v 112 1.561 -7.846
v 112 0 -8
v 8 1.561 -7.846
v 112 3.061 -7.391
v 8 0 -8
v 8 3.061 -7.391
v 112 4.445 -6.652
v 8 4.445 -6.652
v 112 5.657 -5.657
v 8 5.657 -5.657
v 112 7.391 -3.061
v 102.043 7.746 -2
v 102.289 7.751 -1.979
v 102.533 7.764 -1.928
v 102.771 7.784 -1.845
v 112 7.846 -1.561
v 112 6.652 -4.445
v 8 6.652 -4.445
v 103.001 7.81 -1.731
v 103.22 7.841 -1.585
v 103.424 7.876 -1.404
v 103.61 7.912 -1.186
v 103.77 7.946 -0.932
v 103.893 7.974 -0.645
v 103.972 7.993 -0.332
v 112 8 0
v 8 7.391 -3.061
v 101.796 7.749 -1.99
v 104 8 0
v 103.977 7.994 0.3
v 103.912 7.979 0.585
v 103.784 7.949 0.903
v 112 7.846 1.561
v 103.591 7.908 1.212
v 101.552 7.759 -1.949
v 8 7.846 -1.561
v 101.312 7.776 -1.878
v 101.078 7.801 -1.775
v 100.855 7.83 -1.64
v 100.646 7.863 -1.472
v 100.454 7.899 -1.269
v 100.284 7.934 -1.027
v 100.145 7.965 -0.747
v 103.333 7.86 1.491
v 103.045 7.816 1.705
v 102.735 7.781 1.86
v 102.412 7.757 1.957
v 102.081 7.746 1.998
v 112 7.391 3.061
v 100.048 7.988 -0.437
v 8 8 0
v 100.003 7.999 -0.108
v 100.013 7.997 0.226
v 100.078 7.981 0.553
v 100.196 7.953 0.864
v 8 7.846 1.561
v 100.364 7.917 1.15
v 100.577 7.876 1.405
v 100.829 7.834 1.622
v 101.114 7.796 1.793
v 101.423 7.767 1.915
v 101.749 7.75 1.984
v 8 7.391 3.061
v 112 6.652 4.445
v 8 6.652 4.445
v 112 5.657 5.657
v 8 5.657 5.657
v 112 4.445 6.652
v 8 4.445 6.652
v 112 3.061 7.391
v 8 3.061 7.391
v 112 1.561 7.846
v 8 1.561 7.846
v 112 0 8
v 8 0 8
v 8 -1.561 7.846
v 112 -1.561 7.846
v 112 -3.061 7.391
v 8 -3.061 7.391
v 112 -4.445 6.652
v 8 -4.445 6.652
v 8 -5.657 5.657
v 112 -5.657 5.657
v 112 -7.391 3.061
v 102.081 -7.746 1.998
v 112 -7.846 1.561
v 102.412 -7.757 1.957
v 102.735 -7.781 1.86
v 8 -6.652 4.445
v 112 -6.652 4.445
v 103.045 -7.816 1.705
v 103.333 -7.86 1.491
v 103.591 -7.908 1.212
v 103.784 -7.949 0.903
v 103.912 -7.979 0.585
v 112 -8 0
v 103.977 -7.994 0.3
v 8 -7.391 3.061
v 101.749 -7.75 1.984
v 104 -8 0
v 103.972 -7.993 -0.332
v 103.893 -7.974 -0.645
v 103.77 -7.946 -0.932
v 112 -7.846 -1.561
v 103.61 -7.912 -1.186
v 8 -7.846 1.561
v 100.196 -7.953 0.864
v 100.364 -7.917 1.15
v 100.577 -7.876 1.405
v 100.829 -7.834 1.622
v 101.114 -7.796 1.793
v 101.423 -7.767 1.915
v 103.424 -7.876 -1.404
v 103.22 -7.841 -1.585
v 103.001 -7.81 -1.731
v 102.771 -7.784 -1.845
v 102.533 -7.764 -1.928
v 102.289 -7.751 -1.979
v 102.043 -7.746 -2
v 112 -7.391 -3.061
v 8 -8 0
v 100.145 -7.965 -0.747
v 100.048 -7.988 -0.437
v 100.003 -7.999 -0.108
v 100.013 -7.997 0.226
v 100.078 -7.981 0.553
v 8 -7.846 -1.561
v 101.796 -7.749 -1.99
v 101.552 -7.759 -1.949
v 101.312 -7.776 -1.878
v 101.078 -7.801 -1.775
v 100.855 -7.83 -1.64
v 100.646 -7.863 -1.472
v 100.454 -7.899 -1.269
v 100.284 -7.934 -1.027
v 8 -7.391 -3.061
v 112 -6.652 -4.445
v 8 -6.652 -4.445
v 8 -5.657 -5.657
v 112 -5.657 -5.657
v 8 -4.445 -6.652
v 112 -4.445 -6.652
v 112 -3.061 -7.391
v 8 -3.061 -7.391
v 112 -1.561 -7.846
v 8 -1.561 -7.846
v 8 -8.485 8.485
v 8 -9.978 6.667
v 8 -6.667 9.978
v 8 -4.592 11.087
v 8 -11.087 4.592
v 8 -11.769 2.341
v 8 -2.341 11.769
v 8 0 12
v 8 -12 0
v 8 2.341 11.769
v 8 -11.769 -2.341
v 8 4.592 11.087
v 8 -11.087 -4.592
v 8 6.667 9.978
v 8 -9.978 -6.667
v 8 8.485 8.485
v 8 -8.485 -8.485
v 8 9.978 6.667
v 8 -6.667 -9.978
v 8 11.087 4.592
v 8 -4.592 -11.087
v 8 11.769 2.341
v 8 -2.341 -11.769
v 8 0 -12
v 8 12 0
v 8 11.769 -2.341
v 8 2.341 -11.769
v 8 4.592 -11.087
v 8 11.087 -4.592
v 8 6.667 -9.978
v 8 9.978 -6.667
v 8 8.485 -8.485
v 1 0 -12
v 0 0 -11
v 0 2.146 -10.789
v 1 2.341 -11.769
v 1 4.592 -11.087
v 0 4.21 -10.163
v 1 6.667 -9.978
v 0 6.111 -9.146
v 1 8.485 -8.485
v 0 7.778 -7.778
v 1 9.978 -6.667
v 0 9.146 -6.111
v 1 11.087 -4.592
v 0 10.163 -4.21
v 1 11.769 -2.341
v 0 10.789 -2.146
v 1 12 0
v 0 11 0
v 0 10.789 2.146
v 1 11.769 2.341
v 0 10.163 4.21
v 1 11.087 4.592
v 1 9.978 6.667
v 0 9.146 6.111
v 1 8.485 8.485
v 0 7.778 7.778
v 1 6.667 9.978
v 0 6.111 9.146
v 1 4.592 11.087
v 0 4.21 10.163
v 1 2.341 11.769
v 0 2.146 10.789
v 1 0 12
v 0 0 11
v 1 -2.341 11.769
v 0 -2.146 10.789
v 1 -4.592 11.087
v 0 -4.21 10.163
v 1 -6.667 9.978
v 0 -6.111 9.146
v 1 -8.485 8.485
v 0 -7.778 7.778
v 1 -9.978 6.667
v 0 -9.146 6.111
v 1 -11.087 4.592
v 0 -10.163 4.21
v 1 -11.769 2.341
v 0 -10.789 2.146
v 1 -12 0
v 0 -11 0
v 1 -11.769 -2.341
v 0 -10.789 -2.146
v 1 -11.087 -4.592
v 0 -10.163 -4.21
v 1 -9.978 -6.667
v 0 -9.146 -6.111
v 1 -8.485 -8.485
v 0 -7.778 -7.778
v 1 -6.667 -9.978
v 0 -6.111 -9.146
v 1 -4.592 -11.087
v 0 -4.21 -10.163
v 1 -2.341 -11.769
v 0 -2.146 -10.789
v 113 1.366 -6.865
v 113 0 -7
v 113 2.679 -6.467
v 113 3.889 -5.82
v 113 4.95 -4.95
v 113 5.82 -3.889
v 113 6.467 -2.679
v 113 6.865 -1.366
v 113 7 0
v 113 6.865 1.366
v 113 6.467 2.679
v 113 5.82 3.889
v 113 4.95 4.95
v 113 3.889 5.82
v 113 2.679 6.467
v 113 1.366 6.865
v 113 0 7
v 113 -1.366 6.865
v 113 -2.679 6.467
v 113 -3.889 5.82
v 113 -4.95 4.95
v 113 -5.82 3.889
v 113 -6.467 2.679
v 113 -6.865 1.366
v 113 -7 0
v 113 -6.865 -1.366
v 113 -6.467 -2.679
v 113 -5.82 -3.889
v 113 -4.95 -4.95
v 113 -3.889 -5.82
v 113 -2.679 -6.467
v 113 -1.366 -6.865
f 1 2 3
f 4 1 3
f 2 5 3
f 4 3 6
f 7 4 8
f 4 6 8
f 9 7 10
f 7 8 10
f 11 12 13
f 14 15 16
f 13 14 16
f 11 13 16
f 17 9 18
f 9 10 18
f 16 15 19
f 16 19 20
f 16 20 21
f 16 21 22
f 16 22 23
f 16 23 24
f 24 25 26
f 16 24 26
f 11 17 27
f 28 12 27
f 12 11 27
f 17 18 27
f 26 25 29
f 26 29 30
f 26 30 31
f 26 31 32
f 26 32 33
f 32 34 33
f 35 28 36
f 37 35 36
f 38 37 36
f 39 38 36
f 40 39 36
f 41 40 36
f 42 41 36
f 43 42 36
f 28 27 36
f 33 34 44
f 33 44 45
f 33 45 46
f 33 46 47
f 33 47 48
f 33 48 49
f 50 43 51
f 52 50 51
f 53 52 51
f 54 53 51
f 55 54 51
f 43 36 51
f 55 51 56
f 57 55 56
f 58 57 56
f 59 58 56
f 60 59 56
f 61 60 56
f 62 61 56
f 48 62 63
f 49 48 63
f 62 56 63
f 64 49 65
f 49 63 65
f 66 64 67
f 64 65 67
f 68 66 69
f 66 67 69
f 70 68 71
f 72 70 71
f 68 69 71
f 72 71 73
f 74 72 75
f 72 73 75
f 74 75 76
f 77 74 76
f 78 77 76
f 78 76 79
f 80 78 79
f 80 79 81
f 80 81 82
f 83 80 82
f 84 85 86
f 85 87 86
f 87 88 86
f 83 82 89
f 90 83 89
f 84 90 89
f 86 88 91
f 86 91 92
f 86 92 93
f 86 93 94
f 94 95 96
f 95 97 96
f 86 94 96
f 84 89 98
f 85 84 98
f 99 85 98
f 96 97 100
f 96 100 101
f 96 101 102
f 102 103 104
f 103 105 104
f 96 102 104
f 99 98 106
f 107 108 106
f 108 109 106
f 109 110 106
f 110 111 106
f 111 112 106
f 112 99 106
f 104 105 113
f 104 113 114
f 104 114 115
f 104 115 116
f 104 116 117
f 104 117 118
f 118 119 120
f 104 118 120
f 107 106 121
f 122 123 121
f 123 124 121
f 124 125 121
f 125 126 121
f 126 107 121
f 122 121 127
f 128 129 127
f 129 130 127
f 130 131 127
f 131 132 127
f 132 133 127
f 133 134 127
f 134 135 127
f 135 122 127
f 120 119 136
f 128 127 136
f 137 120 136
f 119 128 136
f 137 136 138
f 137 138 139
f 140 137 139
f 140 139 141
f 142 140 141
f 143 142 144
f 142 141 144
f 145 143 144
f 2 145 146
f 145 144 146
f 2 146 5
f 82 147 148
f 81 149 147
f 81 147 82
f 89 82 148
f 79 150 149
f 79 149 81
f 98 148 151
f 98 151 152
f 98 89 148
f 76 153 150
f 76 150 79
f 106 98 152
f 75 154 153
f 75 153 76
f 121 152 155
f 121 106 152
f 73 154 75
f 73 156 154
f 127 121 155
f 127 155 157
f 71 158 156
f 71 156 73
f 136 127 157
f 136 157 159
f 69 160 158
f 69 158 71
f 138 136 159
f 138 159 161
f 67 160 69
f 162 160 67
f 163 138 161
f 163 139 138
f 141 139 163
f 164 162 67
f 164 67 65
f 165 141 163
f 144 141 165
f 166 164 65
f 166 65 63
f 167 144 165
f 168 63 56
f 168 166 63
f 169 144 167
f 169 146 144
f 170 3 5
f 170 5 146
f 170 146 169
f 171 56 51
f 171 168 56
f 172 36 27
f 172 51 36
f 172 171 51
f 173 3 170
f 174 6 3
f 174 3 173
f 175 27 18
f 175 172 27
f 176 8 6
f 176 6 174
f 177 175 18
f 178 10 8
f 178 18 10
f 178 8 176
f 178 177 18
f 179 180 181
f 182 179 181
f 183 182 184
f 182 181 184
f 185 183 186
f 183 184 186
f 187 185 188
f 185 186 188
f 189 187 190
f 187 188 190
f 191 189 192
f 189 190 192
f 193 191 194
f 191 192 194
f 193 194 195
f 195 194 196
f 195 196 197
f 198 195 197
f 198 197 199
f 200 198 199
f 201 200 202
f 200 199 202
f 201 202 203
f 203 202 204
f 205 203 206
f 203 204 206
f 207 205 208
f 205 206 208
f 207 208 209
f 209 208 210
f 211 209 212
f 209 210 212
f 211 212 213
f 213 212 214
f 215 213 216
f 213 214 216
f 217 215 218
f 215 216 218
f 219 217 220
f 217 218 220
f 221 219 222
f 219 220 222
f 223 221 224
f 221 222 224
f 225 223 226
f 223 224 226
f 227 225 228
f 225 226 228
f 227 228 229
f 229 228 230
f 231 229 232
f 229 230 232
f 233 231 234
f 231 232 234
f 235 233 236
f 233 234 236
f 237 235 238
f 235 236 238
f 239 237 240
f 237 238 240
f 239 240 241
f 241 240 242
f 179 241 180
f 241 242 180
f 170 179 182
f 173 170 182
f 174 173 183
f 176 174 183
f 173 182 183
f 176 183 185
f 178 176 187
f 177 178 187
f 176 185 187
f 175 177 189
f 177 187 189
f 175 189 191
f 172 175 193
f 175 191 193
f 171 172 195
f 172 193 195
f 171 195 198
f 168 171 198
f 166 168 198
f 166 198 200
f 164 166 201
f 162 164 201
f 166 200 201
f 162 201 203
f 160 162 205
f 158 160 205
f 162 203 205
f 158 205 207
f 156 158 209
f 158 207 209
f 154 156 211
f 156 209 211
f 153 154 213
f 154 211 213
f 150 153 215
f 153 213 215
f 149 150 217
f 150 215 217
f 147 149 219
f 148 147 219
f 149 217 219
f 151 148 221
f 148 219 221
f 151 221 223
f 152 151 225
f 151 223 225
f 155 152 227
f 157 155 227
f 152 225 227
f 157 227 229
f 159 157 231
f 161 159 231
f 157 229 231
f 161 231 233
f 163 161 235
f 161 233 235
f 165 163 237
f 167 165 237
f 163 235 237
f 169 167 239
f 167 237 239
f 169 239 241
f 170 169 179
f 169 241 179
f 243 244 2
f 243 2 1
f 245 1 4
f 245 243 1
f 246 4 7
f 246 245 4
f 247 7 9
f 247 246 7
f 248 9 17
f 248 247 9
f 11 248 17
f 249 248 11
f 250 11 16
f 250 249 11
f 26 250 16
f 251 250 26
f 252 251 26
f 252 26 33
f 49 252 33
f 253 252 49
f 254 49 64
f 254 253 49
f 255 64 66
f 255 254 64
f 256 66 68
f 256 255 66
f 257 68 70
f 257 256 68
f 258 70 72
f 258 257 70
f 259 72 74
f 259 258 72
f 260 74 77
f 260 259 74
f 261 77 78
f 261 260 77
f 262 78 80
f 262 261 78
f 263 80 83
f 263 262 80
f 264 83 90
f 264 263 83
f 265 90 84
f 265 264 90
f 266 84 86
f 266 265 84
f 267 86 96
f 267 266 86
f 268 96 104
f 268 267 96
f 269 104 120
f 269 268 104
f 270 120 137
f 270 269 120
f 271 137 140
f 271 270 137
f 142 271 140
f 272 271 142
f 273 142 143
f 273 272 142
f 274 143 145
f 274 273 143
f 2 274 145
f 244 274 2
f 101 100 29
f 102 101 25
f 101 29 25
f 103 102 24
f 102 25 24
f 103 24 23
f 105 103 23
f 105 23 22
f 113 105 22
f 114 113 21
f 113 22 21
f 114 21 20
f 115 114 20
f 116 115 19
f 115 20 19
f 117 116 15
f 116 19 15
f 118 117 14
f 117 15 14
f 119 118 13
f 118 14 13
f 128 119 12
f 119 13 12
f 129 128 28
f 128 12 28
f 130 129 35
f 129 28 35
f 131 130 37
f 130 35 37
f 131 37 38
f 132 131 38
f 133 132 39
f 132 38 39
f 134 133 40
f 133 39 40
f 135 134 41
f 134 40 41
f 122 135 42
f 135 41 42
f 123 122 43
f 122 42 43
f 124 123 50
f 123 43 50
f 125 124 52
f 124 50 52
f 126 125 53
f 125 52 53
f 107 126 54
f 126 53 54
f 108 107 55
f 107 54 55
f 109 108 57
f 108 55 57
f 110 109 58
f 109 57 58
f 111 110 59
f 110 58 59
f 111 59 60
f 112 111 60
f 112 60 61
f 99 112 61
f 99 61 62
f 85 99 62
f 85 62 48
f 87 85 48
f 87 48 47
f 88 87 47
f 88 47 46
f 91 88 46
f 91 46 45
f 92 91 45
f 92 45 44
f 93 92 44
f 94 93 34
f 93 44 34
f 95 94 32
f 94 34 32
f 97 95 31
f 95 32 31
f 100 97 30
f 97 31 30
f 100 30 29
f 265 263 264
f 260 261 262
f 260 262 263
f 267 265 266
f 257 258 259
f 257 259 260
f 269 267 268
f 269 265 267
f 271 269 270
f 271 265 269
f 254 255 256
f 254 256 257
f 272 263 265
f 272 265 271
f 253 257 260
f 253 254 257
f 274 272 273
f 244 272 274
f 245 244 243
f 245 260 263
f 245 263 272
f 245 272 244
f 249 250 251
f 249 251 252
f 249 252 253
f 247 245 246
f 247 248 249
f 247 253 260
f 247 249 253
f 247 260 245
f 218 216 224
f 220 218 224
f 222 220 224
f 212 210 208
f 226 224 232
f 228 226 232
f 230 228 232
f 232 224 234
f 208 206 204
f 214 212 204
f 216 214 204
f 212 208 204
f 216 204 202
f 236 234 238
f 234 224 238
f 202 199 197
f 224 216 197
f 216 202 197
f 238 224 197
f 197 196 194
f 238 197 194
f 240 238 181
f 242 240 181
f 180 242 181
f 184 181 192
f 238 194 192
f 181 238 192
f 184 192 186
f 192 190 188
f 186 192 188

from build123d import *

# Parameters (mm, degrees)
SKETCH1_R           = 12
BOSS_EXTRUDE1_DEPTH = 8
CHAMFER1_SIZE       = 1
SKETCH2_R           = 8
BOSS_EXTRUDE2_DEPTH = 105
CHAMFER2_SIZE       = 1
SKETCH3_R           = 2
CUT_EXTRUDE1_DEPTH  = 52.5


with BuildPart() as part:
    # Sketch1 → Boss-Extrude1 (new body)
    with BuildSketch(Plane(origin=(0, 0, 0), x_dir=(0, 0, -1), z_dir=(1, 0, 0))):
        Circle(SKETCH1_R)
    extrude(amount=BOSS_EXTRUDE1_DEPTH)

    # Chamfer1
    chamfer1_edges = [part.edges().sort_by_distance(p)[0] for p in [
        (0, 0, 12),
    ]]
    chamfer(chamfer1_edges, length=CHAMFER1_SIZE)

    # Sketch2 → Boss-Extrude2 (add)
    with BuildSketch(Plane(origin=(8, 0, 0), x_dir=(0, 0, -1), z_dir=(1, 0, 0))):
        Circle(SKETCH2_R)
    extrude(amount=BOSS_EXTRUDE2_DEPTH)

    # Chamfer2
    chamfer2_edges = [part.edges().sort_by_distance(p)[0] for p in [
        (113, 0, 8),
    ]]
    chamfer(chamfer2_edges, length=CHAMFER2_SIZE)

    # Sketch3 → Cut-Extrude1 (cut, symmetric)
    with BuildSketch(Plane(origin=(0, 0, 0), x_dir=(1, 0, 0), z_dir=(0, 1, 0))):
        with Locations((102, 0)):
            Circle(SKETCH3_R)
    extrude(amount=CUT_EXTRUDE1_DEPTH, both=True, mode=Mode.SUBTRACT)


solid = part.part
